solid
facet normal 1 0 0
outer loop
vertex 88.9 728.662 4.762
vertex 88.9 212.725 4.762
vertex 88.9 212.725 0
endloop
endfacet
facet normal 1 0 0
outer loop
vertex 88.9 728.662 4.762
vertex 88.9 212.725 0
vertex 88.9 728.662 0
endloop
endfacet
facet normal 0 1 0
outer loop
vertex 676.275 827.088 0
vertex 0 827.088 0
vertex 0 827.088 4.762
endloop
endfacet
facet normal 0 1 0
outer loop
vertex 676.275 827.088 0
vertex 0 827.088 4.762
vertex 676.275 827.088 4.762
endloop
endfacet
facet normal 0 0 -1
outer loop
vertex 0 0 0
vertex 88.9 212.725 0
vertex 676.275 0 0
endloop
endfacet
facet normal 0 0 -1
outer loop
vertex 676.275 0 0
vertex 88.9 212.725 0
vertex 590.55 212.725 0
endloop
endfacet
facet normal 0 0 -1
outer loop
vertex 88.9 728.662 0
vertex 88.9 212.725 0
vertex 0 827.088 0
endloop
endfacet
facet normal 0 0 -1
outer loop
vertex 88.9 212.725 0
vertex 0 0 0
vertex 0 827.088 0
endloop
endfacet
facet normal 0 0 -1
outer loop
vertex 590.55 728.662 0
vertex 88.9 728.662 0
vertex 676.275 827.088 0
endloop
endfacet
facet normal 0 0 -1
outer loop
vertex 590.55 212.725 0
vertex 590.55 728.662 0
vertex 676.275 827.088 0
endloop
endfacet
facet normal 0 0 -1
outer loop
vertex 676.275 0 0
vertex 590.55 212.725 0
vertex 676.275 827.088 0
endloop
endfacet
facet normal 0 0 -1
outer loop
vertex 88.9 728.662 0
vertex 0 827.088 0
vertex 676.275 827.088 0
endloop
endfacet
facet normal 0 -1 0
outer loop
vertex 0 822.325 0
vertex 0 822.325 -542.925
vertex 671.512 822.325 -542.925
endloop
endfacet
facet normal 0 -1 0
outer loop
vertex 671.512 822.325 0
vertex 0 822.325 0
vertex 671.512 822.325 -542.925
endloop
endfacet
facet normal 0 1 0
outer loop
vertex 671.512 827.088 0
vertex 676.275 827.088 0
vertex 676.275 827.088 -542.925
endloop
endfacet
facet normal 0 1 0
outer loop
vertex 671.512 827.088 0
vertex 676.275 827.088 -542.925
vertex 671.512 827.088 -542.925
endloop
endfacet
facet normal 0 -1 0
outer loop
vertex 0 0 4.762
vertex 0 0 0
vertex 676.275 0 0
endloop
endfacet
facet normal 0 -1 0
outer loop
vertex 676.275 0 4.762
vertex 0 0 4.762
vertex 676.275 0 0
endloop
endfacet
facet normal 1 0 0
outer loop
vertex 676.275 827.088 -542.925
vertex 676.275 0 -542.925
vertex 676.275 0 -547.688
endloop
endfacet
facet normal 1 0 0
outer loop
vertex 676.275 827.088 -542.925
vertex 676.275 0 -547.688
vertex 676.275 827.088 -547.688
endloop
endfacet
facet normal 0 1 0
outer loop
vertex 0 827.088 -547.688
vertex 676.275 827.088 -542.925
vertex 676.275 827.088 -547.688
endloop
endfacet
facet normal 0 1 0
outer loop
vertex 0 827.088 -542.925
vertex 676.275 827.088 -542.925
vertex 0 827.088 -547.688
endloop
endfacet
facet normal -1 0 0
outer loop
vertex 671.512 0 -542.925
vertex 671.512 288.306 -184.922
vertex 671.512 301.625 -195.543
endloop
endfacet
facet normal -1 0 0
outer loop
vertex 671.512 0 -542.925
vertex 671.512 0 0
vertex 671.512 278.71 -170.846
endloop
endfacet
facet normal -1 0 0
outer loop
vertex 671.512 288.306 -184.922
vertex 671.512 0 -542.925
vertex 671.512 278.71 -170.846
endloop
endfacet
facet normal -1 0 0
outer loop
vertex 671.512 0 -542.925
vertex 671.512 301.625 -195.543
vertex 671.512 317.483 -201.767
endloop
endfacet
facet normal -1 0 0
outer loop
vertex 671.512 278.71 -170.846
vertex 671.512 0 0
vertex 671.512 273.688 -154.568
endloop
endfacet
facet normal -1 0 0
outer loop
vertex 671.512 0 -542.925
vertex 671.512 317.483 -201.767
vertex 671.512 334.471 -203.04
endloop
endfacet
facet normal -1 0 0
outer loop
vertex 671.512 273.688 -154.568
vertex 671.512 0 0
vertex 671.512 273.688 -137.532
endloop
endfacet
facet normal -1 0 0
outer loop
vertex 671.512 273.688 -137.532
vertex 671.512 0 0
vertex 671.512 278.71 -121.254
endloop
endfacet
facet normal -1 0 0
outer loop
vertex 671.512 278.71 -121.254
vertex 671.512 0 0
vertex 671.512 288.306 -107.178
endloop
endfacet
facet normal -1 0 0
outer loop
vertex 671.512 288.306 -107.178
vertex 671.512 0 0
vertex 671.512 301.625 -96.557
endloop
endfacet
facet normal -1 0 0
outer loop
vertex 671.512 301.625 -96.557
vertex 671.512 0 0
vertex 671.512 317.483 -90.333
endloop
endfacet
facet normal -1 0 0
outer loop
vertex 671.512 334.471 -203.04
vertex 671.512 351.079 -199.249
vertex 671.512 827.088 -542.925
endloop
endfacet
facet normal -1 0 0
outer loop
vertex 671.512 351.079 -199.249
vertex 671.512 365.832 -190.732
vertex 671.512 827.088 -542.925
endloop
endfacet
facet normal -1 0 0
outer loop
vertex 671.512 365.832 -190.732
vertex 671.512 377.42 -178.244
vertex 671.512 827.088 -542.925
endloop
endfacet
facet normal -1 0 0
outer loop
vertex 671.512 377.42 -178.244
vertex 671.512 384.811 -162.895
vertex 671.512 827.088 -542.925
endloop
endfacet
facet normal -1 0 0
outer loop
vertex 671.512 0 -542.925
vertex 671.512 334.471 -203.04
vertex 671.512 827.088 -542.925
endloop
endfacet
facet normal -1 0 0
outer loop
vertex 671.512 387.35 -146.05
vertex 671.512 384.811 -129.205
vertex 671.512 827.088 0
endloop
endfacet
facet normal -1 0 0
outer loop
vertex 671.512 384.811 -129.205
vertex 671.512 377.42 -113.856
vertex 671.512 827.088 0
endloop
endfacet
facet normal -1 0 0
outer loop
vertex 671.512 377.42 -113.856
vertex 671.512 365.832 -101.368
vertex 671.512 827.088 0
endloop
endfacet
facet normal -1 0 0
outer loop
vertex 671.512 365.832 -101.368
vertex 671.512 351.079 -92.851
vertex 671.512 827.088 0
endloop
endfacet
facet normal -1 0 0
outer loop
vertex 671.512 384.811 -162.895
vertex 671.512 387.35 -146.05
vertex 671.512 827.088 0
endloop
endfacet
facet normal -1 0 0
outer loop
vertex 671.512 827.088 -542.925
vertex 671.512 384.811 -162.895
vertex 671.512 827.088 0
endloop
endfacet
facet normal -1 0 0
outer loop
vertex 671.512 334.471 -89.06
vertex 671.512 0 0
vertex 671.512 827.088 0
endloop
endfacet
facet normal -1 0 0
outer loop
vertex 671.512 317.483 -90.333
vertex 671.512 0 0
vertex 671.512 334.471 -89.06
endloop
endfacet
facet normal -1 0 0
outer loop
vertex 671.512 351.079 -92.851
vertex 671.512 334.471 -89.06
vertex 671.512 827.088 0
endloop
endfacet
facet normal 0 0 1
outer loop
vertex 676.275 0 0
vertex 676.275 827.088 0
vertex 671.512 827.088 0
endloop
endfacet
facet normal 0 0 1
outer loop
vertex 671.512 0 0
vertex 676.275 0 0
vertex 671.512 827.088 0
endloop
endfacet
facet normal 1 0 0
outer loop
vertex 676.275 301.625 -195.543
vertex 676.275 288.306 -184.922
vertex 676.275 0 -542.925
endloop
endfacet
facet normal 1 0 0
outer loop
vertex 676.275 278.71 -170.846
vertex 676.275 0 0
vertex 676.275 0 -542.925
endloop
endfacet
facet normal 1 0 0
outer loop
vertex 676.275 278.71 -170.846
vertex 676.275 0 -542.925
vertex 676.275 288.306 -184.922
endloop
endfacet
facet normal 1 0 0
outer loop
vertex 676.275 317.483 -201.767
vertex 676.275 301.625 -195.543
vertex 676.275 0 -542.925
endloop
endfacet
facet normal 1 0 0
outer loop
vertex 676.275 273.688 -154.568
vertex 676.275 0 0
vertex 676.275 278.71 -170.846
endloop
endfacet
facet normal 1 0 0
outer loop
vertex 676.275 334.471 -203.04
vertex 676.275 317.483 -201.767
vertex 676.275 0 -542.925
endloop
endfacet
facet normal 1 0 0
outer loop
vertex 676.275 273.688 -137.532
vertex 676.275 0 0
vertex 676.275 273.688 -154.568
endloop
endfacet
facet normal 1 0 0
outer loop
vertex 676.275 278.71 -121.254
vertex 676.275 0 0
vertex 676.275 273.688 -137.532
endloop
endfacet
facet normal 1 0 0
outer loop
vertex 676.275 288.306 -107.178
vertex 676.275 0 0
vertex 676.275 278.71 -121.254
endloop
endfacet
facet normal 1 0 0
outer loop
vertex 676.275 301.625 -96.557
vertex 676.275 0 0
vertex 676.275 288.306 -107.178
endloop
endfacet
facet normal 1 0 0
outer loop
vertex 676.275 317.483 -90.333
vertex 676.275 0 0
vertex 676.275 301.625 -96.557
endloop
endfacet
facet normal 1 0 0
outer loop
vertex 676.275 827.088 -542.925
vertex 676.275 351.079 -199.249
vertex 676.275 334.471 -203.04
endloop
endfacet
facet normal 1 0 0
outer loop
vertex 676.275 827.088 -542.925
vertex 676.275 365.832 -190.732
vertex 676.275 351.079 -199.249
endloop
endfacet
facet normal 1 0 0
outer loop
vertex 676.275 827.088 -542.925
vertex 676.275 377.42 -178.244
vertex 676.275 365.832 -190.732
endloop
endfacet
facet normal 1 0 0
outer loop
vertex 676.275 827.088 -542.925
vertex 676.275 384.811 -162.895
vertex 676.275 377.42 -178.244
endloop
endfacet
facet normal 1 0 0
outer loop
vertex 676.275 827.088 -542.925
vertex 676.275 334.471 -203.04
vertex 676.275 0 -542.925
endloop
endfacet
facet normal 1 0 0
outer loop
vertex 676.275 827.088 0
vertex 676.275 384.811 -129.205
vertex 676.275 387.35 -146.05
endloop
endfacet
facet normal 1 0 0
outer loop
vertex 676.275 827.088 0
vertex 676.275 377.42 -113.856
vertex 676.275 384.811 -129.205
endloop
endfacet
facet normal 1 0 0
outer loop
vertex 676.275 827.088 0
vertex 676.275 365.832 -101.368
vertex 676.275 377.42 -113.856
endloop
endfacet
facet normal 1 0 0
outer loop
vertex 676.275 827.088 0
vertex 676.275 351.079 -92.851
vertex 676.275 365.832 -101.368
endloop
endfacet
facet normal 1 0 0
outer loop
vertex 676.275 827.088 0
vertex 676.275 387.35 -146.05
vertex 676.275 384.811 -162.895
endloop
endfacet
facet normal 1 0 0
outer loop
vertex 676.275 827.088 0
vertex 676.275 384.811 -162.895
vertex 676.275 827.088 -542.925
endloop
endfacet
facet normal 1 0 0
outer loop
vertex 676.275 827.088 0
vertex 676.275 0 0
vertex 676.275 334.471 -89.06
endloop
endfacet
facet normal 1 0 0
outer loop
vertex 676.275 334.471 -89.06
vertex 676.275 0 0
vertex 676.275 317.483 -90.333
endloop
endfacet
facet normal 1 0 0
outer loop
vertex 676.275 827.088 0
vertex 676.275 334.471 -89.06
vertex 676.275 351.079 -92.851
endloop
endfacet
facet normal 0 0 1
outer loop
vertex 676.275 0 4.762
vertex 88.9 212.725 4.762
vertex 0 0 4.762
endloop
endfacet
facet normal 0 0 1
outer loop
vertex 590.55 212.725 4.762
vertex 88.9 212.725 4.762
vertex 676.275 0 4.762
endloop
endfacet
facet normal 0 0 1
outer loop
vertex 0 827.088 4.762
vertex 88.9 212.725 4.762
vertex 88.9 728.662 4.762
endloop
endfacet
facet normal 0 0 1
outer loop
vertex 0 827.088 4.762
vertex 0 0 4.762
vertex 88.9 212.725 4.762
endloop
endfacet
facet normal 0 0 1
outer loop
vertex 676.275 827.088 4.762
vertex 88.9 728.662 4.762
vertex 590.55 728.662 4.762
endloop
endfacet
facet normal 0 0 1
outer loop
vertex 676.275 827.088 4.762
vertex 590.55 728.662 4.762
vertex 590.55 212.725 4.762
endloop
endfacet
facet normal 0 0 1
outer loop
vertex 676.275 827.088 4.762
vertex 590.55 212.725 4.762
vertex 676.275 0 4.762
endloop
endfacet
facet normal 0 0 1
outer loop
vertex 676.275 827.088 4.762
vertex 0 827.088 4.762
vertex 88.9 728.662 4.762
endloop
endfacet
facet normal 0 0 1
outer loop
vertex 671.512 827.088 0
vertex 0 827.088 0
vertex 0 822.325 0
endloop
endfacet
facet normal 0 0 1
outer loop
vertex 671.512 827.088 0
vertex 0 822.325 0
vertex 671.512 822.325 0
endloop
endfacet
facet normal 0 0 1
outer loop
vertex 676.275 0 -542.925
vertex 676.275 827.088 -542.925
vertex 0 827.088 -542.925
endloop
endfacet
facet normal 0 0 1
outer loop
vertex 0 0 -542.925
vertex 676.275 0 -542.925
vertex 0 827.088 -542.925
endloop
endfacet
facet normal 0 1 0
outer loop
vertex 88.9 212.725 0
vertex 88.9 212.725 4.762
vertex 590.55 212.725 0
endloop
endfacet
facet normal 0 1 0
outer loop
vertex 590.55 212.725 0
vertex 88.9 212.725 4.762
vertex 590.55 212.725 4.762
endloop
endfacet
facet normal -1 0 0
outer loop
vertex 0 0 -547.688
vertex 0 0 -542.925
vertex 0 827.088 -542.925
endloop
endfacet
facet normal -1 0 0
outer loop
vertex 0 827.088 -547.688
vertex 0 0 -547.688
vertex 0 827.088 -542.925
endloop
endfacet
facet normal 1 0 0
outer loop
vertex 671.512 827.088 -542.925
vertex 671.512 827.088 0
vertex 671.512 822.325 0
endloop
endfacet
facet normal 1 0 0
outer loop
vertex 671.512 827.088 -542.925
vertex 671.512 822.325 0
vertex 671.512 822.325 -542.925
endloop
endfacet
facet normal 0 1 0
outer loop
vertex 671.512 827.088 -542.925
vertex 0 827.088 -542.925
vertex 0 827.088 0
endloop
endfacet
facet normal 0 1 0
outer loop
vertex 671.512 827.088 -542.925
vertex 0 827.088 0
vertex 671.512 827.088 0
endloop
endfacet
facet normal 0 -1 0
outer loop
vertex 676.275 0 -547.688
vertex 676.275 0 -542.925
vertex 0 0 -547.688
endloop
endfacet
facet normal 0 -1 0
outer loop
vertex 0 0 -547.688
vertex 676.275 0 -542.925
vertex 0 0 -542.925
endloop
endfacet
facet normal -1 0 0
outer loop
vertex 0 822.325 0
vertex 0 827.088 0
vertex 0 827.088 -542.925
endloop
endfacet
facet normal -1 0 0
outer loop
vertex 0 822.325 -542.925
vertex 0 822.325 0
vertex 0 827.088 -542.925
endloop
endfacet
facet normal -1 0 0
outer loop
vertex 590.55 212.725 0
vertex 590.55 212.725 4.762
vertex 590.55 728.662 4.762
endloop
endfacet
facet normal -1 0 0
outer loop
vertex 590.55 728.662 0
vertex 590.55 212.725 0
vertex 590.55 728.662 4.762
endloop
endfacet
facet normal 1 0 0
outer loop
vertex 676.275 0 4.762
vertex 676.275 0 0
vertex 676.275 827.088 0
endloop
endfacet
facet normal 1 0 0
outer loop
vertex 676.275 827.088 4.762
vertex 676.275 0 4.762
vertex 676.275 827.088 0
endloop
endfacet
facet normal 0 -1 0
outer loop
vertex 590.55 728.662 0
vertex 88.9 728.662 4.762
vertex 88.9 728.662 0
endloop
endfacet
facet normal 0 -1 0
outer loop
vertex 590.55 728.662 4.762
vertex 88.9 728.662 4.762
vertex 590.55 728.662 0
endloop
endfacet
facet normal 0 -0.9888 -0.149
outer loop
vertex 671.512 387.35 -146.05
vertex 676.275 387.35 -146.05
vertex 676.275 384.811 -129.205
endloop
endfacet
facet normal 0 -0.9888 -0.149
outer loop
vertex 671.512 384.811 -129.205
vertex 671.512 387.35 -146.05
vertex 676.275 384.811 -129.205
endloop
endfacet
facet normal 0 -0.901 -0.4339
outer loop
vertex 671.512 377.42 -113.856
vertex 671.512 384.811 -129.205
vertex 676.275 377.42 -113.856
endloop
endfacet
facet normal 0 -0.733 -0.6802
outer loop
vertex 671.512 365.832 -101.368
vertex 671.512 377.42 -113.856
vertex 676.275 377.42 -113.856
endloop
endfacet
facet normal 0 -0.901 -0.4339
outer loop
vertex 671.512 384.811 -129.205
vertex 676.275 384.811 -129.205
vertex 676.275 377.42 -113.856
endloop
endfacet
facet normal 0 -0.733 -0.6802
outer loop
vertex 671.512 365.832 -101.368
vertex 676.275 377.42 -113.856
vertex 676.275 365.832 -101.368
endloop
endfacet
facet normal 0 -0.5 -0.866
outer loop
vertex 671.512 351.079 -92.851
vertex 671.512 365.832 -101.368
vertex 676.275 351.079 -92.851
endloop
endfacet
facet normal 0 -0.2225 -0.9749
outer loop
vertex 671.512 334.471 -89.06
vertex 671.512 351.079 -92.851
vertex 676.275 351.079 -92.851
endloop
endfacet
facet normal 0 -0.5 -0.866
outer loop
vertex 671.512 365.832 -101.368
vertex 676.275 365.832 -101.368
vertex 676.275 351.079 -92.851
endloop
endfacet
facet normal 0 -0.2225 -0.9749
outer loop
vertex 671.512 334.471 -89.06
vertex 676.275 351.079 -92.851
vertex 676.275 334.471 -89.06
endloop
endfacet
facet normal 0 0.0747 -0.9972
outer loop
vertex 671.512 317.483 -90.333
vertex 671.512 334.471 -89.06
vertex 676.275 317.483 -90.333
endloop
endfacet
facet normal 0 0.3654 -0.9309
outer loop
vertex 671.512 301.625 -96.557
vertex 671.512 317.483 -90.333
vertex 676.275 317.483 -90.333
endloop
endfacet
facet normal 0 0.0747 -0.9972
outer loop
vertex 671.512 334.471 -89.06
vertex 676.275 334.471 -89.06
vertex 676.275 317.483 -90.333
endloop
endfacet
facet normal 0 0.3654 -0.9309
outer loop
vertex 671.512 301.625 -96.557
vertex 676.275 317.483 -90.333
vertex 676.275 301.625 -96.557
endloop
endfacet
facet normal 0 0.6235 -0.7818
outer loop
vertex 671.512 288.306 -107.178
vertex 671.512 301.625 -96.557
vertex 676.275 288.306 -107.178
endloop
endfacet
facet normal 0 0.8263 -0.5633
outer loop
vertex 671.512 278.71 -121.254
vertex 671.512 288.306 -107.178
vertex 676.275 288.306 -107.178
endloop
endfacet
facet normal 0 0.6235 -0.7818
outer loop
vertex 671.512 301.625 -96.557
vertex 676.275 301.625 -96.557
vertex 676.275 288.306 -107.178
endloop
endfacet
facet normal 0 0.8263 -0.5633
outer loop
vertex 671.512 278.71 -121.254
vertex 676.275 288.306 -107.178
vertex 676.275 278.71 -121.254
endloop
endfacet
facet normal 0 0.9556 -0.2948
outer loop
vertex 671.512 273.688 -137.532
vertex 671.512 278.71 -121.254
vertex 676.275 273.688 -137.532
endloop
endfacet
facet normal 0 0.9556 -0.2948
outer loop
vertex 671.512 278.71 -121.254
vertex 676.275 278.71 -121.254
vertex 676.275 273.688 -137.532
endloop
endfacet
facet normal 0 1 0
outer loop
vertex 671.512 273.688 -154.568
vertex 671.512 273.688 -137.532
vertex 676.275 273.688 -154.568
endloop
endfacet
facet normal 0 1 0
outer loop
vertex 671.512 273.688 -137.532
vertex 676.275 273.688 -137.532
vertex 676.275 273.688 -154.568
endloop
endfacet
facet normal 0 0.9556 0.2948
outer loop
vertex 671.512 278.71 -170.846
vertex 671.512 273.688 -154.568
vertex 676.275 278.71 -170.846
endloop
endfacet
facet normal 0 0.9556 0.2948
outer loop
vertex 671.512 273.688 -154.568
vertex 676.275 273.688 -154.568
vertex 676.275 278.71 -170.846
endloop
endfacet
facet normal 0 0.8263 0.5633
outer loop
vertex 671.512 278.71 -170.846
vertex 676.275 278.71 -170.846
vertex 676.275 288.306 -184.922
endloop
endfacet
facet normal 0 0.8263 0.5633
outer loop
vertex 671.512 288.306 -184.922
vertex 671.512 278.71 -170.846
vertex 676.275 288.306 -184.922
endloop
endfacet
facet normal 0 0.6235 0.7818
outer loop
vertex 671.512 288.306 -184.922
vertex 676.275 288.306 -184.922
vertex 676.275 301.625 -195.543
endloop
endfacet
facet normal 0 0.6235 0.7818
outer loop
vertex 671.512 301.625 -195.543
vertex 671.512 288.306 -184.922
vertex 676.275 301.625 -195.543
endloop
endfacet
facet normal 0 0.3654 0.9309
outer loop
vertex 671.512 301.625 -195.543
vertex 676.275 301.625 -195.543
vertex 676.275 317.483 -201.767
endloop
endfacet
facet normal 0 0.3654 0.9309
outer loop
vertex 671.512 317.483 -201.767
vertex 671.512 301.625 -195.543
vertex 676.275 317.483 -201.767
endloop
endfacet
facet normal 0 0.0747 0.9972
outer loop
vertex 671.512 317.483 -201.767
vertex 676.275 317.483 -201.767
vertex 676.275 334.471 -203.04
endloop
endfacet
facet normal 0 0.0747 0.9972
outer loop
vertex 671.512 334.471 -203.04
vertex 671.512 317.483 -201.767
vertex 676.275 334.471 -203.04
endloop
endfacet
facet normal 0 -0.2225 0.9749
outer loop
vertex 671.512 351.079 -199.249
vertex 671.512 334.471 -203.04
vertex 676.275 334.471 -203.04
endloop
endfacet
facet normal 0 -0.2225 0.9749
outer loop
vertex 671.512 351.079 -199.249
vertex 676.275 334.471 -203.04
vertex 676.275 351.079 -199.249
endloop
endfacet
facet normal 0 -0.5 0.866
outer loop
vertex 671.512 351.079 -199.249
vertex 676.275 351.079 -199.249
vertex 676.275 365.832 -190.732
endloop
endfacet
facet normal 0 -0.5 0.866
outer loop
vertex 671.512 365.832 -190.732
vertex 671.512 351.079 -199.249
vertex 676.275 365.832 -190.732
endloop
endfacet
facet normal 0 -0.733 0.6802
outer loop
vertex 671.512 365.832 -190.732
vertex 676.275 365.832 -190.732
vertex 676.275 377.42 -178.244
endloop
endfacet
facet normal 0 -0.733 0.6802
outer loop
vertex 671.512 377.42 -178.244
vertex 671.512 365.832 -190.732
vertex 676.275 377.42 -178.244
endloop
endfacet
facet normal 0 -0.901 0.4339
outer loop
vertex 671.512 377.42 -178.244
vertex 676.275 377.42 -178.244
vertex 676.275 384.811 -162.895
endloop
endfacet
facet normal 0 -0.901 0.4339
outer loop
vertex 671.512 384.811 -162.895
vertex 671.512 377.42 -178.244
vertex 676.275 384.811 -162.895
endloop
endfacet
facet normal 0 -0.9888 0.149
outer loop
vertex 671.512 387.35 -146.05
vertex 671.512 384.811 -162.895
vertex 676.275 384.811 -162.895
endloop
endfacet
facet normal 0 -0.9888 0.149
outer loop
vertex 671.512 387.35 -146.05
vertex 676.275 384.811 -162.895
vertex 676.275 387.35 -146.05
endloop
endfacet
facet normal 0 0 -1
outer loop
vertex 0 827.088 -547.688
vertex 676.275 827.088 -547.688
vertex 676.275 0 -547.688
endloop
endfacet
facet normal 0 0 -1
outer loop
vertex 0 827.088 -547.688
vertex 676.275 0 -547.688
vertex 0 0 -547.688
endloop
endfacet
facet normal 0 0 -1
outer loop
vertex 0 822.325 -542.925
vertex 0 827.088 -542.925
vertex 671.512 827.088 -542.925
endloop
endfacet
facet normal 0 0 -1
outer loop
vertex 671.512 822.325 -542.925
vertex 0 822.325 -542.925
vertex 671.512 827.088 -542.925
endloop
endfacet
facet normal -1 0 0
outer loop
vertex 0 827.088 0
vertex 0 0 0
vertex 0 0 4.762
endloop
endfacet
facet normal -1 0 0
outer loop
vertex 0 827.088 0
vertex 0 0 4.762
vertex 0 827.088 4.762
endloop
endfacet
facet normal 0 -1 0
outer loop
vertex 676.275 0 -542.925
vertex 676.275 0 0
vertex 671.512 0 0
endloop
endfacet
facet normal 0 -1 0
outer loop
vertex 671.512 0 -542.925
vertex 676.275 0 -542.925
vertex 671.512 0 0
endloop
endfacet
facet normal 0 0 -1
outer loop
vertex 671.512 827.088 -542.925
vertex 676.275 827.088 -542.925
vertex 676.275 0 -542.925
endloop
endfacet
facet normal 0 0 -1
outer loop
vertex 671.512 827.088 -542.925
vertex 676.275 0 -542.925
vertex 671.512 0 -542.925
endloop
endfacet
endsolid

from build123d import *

# Parameters (mm, degrees)
SKETCH1_W           = 676.275
SKETCH1_H           = 827.0875
BOSS_EXTRUDE1_DEPTH = 4.7625
SKETCH2_W           = 4.7625
SKETCH2_H           = 827.0875
BOSS_EXTRUDE2_DEPTH = 542.925
SKETCH7_W           = 676.275
SKETCH7_H           = 827.0875
BOSS_EXTRUDE4_DEPTH = 4.7625
SKETCH8_W           = 671.5125
SKETCH8_H           = 542.925
BOSS_EXTRUDE6_DEPTH = 4.7625
SKETCH9_W           = 501.65
SKETCH9_H           = 515.9375
CUT_EXTRUDE1_DEPTH  = 4.7625
SKETCH10_R          = 57.15
CUT_EXTRUDE2_DEPTH  = 1201.576197472


with BuildPart() as part:
    # Sketch1 → Boss-Extrude1 (new body)
    with BuildSketch(Plane.XY):
        with Locations((338.1375, 413.54375)):
            Rectangle(SKETCH1_W, SKETCH1_H)
    extrude(amount=BOSS_EXTRUDE1_DEPTH)

    # Sketch9 → Cut-Extrude1 (cut)
    with BuildSketch(Plane.XY.offset(4.7625)):
        with Locations((339.725, 470.69375)):
            Rectangle(SKETCH9_W, SKETCH9_H)
    extrude(amount=-CUT_EXTRUDE1_DEPTH, mode=Mode.SUBTRACT)


with BuildPart() as body_2:
    # Sketch2 → Boss-Extrude2 (new body)
    with BuildSketch(Plane(origin=(0, 0, 0), x_dir=(-1, 0, 0), z_dir=(0, 0, -1))):
        with Locations((-673.89375, 413.54375)):
            Rectangle(SKETCH2_W, SKETCH2_H)
    extrude(amount=BOSS_EXTRUDE2_DEPTH)

    # Sketch10 → Cut-Extrude2 (cut, through all)
    with BuildSketch(Plane(origin=(676.275, 0, 0), x_dir=(0, 0, -1), z_dir=(1, 0, 0))):
        with Locations(Location((146.05, 330.2, 0), (0, 0, 90))):
            Circle(SKETCH10_R)
    extrude(amount=-CUT_EXTRUDE2_DEPTH, mode=Mode.SUBTRACT)


with BuildPart() as body_3:
    # Sketch7 → Boss-Extrude4 (new body)
    with BuildSketch(Plane(origin=(0, 0, -542.925), x_dir=(-1, 0, 0), z_dir=(0, 0, -1))):
        with Locations((-338.1375, 413.54375)):
            Rectangle(SKETCH7_W, SKETCH7_H)
    extrude(amount=BOSS_EXTRUDE4_DEPTH)


with BuildPart() as body_4:
    # Sketch8 → Boss-Extrude6 (new body)
    with BuildSketch(Plane(origin=(0, 827.0875, 0), x_dir=(1, 0, 0), z_dir=(0, 1, 0))):
        with Locations((335.75625, 271.4625)):
            Rectangle(SKETCH8_W, SKETCH8_H)
    extrude(amount=-BOSS_EXTRUDE6_DEPTH)


solid = Compound([part.part, body_2.part, body_3.part, body_4.part])
